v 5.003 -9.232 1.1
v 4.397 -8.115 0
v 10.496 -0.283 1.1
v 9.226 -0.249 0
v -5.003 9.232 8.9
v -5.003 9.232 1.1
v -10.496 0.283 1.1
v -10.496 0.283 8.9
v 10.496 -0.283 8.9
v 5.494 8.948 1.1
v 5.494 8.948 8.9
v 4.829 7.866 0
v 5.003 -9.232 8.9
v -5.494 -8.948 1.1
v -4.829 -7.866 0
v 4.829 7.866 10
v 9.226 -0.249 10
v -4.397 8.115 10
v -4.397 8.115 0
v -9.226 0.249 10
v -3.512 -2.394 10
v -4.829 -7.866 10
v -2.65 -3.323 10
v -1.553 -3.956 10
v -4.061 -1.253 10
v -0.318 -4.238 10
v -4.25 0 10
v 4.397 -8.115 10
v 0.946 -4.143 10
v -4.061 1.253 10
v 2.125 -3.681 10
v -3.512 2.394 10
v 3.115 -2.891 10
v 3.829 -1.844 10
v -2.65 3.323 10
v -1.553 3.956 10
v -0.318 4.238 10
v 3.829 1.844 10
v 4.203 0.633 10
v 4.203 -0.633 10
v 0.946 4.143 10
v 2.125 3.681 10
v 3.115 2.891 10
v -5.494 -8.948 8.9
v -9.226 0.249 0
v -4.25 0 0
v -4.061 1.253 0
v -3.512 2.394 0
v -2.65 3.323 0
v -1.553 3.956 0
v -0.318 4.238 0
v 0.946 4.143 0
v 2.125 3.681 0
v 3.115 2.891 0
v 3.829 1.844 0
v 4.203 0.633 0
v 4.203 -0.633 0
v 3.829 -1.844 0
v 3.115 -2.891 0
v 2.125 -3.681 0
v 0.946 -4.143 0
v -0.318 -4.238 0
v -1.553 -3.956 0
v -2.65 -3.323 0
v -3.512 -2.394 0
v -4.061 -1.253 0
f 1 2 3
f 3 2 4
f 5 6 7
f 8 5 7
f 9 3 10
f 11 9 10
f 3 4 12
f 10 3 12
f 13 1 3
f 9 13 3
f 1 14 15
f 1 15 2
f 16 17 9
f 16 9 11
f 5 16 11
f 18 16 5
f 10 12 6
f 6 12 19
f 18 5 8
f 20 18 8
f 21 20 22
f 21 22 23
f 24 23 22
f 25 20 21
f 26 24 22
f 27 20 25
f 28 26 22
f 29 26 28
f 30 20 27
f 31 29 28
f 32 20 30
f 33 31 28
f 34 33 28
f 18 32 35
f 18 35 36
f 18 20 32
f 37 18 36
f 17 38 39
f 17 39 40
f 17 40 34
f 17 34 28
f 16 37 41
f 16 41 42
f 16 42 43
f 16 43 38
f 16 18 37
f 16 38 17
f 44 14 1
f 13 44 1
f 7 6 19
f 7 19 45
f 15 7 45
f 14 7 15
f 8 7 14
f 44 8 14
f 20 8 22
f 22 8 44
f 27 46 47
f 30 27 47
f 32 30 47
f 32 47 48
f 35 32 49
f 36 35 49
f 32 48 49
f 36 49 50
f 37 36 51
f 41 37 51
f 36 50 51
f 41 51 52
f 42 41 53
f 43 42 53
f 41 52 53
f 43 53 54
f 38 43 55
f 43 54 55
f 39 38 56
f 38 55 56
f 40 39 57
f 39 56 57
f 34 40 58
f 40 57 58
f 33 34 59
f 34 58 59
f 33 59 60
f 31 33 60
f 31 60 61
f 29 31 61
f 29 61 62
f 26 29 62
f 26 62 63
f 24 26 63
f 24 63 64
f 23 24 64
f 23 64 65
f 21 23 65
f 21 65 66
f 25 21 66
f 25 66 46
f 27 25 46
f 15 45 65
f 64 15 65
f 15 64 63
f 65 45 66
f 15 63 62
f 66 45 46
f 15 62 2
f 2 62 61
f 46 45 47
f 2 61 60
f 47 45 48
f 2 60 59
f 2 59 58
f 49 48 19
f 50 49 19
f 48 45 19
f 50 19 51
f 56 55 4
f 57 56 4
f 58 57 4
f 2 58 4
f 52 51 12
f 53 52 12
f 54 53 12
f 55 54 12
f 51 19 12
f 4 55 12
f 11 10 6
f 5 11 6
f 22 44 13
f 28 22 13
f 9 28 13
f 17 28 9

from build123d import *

# Parameters (mm, degrees)
F1_DEPTH = 10
F3_D     = 8.5
F4_SIZE  = 1.1


with BuildPart() as f1:
    # F0 (on Top) → F1 (new body)
    with BuildSketch(Plane.XY):
        Polygon((10.4961740703, -0.2834252726), (5.4935405213, 8.9482407512), (-5.0026335491, 9.2316660237), (-10.4961740703, 0.2834252726), (-5.4935405213, -8.9482407512), (5.0026335491, -9.2316660237), align=None)
    extrude(amount=F1_DEPTH)

    # F3 (through all)
    with Locations(Plane.XY.offset(10)):
        with Locations((0, 0)):
            Hole(F3_D / 2)

    # F4
    f4_edges = [f1.edges().sort_by_distance(p)[0] for p in [
        (-7.994857, -4.332408, 10),
        (-7.749404, 4.757546, 10),
        (0.245453, 9.089953, 10),
        (7.994857, 4.332408, 10),
        (7.749404, -4.757546, 10),
        (-0.245453, -9.089953, 10),
        (-0.245453, -9.089953, 0),
        (7.749404, -4.757546, 0),
        (7.994857, 4.332408, 0),
        (0.245453, 9.089953, 0),
        (-7.749404, 4.757546, 0),
        (-7.994857, -4.332408, 0),
    ]]
    chamfer(f4_edges, length=F4_SIZE)


solid = f1.part
